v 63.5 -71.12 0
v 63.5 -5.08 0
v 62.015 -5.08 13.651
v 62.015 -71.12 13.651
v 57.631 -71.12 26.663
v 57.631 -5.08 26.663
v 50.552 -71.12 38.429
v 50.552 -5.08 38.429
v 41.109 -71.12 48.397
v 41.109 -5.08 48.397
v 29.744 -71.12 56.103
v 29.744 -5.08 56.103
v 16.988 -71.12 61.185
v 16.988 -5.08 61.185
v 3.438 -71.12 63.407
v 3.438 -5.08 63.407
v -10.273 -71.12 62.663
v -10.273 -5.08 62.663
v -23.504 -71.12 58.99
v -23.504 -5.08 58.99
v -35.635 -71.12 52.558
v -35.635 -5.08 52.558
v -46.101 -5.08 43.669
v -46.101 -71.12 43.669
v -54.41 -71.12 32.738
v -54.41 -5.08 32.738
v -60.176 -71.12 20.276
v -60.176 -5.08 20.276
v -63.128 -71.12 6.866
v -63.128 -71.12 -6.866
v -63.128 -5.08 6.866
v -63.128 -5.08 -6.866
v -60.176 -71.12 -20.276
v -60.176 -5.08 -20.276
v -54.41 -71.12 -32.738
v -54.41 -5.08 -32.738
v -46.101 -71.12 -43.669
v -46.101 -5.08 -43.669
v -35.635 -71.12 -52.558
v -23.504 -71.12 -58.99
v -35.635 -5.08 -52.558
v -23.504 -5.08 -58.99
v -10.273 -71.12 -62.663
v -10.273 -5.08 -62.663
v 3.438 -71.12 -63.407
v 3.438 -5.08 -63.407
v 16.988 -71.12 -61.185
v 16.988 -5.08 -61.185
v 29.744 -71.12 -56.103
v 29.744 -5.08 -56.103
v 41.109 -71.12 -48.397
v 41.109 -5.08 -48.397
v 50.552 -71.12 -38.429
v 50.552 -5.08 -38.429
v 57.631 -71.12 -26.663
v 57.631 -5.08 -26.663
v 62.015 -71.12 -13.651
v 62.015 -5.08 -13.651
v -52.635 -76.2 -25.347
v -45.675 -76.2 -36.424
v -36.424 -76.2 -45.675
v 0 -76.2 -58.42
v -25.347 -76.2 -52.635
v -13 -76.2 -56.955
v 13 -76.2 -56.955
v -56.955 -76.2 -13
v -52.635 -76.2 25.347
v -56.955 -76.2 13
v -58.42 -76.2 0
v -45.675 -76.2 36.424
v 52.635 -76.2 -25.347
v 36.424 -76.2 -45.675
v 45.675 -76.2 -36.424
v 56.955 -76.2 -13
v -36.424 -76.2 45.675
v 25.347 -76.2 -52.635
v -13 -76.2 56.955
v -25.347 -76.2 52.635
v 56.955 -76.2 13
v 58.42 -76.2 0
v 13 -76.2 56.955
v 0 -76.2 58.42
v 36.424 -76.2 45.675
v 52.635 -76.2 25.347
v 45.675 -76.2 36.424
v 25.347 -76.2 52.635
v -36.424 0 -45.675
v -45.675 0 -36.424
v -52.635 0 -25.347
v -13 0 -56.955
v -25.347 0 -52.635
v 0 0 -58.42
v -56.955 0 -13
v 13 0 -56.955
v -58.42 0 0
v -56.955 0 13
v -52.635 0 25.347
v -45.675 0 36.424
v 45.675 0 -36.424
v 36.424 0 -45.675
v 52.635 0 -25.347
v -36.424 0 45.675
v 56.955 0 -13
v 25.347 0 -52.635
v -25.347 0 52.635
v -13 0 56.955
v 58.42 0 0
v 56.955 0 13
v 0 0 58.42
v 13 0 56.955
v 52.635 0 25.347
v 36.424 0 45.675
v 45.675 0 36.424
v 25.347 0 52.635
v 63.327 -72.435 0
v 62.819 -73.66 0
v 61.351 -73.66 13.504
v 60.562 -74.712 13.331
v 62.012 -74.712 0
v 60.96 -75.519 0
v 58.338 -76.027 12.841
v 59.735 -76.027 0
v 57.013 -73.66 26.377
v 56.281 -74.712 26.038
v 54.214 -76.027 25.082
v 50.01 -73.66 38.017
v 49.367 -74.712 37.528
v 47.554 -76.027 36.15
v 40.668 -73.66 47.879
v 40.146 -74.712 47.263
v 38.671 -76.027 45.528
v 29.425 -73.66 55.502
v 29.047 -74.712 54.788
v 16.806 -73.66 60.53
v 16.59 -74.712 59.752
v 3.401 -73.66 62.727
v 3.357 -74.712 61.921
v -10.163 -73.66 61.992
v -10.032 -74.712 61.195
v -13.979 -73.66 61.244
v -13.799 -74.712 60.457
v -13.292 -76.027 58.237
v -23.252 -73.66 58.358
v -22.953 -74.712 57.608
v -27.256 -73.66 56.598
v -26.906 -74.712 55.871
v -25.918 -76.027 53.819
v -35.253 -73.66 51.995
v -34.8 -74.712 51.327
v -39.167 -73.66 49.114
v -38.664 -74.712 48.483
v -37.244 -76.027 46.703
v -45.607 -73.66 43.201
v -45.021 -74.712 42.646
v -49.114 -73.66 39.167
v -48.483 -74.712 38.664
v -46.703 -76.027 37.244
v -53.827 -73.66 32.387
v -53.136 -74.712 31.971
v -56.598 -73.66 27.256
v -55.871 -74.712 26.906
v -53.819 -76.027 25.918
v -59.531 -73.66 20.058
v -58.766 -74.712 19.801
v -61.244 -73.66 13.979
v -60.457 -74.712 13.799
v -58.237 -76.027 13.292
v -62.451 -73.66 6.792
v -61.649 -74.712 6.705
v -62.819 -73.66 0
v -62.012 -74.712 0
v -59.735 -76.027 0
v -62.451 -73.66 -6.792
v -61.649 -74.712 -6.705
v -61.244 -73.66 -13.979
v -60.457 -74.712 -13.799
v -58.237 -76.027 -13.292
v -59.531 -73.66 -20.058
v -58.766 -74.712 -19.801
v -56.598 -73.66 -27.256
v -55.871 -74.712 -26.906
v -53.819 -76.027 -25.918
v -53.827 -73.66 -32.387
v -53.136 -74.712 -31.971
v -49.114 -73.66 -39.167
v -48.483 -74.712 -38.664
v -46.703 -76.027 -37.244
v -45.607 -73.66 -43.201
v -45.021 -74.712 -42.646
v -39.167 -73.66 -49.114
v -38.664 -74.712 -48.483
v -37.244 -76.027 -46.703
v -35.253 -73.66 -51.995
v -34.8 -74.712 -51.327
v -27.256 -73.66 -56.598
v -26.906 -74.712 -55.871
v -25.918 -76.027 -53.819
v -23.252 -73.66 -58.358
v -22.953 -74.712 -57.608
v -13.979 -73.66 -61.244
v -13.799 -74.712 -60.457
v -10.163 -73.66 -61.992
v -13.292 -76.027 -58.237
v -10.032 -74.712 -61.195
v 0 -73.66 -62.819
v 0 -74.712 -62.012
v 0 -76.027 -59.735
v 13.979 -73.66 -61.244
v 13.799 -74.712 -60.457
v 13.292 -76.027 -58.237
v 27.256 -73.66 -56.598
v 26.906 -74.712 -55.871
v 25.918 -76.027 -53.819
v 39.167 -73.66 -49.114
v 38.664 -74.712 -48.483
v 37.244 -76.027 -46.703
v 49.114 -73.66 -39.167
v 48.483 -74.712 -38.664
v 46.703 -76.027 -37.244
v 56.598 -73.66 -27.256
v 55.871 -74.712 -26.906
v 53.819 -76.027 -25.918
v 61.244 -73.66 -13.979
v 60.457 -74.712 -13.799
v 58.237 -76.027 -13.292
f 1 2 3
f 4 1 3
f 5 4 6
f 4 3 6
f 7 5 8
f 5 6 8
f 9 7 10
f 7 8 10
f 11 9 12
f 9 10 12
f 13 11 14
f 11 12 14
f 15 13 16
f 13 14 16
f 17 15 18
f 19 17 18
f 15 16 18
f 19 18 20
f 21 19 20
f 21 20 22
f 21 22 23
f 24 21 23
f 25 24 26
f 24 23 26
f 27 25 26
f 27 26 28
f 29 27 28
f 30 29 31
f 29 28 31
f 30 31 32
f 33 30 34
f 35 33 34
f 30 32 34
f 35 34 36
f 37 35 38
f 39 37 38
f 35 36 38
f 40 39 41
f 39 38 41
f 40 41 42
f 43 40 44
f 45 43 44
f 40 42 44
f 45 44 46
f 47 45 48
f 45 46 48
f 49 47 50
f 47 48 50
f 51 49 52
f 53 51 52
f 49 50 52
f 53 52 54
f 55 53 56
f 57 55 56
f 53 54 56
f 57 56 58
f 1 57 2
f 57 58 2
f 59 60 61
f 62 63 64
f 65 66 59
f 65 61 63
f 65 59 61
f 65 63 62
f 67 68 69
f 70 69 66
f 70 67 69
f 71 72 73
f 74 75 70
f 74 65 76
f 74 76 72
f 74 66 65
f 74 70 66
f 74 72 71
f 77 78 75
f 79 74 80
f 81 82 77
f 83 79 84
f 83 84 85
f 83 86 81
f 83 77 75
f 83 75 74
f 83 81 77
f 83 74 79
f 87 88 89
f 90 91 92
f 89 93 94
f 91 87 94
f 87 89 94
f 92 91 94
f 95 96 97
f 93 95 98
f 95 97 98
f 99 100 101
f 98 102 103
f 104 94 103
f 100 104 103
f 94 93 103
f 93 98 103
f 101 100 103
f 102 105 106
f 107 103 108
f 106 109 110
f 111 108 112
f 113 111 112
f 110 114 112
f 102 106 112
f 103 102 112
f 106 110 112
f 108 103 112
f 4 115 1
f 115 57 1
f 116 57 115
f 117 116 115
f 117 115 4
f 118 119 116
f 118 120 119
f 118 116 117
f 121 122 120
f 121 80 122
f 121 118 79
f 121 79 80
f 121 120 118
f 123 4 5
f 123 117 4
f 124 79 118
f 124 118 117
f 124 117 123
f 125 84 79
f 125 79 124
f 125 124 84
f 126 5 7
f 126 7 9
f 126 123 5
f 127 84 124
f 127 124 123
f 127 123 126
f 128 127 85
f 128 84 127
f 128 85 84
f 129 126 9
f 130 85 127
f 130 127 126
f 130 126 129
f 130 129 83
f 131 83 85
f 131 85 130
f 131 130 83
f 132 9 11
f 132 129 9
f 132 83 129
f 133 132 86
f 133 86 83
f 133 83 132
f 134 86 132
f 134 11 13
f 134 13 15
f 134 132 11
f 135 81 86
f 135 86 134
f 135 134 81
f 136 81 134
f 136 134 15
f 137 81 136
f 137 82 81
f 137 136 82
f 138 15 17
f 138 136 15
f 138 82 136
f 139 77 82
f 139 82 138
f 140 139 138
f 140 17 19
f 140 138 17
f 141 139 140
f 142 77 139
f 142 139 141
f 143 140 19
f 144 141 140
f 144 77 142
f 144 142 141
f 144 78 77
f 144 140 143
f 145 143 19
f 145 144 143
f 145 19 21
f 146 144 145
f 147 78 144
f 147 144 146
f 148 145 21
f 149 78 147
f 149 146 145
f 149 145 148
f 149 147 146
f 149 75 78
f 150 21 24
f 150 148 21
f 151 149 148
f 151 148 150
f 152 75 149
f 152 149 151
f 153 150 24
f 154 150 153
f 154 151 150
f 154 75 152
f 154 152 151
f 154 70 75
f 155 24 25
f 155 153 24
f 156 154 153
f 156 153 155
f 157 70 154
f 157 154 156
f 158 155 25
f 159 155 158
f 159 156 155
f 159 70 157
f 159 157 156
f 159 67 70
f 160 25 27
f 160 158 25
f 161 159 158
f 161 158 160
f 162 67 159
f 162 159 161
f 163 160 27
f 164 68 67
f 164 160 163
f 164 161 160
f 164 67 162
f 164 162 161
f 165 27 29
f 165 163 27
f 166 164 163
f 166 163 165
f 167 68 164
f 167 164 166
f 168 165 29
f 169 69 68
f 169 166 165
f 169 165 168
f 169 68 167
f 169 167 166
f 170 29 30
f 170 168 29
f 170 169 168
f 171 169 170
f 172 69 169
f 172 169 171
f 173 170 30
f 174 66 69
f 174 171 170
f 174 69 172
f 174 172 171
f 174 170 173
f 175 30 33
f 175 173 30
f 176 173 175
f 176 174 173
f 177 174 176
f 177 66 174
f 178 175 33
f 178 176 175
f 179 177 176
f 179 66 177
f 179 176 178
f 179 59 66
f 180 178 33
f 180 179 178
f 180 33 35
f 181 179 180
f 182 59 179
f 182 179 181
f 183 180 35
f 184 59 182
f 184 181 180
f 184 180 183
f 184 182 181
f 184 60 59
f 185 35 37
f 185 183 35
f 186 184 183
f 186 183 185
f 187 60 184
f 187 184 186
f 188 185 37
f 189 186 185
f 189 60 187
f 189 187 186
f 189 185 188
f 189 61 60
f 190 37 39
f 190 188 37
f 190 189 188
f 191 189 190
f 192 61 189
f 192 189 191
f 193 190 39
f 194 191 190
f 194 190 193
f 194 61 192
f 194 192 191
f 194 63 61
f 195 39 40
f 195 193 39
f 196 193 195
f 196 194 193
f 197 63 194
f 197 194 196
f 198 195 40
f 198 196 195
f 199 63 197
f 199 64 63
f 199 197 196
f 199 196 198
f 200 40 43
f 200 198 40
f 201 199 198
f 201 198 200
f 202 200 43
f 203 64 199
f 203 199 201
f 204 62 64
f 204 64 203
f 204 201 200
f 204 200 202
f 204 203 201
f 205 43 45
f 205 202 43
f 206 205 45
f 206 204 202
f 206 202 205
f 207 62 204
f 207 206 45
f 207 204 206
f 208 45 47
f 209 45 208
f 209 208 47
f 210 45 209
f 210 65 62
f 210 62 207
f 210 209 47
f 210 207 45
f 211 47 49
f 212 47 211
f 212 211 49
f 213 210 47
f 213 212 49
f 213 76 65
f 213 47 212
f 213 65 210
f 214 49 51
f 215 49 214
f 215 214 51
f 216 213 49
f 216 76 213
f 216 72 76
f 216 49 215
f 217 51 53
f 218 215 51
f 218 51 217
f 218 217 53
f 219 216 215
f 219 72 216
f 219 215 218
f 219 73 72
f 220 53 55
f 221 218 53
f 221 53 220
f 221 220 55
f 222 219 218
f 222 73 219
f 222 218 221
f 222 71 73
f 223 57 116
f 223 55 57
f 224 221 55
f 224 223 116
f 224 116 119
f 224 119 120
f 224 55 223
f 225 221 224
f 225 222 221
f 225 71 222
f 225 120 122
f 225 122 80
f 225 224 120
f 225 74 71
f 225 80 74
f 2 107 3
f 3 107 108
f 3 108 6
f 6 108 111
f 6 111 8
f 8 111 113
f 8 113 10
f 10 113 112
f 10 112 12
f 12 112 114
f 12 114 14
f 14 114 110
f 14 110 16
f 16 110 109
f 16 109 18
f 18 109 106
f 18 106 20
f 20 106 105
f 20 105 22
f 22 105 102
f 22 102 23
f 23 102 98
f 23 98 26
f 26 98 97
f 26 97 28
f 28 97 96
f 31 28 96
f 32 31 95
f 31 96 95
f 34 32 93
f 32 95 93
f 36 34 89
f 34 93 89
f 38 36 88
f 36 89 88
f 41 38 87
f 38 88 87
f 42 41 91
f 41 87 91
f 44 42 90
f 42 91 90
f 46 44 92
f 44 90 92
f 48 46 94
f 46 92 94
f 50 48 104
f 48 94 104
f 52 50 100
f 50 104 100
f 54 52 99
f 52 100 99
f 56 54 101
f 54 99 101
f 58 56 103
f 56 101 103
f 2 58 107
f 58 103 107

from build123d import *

# Parameters (mm, degrees)
F0_R     = 63.5
F1_DEPTH = 76.2
F6_R     = 5.08
F7_SIZE  = 5.08


# Not quite as in the source:
# - the program builds the solid bodies; features that only make, move or delete a surface that nothing else refers to are left out


with BuildPart() as f1:
    # F0 (on Front) → F1 (new body)
    with BuildSketch(Plane.XZ):
        Circle(F0_R)
    extrude(amount=F1_DEPTH)

    # F6
    f6_edges = [f1.edges().sort_by_distance(p)[0] for p in [
        (-63.5, -76.2, 0),
    ]]
    fillet(f6_edges, radius=F6_R)

    # F7
    f7_edges = [f1.edges().sort_by_distance(p)[0] for p in [
        (-63.5, 0, 0),
    ]]
    chamfer(f7_edges, length=F7_SIZE)


solid = f1.part
